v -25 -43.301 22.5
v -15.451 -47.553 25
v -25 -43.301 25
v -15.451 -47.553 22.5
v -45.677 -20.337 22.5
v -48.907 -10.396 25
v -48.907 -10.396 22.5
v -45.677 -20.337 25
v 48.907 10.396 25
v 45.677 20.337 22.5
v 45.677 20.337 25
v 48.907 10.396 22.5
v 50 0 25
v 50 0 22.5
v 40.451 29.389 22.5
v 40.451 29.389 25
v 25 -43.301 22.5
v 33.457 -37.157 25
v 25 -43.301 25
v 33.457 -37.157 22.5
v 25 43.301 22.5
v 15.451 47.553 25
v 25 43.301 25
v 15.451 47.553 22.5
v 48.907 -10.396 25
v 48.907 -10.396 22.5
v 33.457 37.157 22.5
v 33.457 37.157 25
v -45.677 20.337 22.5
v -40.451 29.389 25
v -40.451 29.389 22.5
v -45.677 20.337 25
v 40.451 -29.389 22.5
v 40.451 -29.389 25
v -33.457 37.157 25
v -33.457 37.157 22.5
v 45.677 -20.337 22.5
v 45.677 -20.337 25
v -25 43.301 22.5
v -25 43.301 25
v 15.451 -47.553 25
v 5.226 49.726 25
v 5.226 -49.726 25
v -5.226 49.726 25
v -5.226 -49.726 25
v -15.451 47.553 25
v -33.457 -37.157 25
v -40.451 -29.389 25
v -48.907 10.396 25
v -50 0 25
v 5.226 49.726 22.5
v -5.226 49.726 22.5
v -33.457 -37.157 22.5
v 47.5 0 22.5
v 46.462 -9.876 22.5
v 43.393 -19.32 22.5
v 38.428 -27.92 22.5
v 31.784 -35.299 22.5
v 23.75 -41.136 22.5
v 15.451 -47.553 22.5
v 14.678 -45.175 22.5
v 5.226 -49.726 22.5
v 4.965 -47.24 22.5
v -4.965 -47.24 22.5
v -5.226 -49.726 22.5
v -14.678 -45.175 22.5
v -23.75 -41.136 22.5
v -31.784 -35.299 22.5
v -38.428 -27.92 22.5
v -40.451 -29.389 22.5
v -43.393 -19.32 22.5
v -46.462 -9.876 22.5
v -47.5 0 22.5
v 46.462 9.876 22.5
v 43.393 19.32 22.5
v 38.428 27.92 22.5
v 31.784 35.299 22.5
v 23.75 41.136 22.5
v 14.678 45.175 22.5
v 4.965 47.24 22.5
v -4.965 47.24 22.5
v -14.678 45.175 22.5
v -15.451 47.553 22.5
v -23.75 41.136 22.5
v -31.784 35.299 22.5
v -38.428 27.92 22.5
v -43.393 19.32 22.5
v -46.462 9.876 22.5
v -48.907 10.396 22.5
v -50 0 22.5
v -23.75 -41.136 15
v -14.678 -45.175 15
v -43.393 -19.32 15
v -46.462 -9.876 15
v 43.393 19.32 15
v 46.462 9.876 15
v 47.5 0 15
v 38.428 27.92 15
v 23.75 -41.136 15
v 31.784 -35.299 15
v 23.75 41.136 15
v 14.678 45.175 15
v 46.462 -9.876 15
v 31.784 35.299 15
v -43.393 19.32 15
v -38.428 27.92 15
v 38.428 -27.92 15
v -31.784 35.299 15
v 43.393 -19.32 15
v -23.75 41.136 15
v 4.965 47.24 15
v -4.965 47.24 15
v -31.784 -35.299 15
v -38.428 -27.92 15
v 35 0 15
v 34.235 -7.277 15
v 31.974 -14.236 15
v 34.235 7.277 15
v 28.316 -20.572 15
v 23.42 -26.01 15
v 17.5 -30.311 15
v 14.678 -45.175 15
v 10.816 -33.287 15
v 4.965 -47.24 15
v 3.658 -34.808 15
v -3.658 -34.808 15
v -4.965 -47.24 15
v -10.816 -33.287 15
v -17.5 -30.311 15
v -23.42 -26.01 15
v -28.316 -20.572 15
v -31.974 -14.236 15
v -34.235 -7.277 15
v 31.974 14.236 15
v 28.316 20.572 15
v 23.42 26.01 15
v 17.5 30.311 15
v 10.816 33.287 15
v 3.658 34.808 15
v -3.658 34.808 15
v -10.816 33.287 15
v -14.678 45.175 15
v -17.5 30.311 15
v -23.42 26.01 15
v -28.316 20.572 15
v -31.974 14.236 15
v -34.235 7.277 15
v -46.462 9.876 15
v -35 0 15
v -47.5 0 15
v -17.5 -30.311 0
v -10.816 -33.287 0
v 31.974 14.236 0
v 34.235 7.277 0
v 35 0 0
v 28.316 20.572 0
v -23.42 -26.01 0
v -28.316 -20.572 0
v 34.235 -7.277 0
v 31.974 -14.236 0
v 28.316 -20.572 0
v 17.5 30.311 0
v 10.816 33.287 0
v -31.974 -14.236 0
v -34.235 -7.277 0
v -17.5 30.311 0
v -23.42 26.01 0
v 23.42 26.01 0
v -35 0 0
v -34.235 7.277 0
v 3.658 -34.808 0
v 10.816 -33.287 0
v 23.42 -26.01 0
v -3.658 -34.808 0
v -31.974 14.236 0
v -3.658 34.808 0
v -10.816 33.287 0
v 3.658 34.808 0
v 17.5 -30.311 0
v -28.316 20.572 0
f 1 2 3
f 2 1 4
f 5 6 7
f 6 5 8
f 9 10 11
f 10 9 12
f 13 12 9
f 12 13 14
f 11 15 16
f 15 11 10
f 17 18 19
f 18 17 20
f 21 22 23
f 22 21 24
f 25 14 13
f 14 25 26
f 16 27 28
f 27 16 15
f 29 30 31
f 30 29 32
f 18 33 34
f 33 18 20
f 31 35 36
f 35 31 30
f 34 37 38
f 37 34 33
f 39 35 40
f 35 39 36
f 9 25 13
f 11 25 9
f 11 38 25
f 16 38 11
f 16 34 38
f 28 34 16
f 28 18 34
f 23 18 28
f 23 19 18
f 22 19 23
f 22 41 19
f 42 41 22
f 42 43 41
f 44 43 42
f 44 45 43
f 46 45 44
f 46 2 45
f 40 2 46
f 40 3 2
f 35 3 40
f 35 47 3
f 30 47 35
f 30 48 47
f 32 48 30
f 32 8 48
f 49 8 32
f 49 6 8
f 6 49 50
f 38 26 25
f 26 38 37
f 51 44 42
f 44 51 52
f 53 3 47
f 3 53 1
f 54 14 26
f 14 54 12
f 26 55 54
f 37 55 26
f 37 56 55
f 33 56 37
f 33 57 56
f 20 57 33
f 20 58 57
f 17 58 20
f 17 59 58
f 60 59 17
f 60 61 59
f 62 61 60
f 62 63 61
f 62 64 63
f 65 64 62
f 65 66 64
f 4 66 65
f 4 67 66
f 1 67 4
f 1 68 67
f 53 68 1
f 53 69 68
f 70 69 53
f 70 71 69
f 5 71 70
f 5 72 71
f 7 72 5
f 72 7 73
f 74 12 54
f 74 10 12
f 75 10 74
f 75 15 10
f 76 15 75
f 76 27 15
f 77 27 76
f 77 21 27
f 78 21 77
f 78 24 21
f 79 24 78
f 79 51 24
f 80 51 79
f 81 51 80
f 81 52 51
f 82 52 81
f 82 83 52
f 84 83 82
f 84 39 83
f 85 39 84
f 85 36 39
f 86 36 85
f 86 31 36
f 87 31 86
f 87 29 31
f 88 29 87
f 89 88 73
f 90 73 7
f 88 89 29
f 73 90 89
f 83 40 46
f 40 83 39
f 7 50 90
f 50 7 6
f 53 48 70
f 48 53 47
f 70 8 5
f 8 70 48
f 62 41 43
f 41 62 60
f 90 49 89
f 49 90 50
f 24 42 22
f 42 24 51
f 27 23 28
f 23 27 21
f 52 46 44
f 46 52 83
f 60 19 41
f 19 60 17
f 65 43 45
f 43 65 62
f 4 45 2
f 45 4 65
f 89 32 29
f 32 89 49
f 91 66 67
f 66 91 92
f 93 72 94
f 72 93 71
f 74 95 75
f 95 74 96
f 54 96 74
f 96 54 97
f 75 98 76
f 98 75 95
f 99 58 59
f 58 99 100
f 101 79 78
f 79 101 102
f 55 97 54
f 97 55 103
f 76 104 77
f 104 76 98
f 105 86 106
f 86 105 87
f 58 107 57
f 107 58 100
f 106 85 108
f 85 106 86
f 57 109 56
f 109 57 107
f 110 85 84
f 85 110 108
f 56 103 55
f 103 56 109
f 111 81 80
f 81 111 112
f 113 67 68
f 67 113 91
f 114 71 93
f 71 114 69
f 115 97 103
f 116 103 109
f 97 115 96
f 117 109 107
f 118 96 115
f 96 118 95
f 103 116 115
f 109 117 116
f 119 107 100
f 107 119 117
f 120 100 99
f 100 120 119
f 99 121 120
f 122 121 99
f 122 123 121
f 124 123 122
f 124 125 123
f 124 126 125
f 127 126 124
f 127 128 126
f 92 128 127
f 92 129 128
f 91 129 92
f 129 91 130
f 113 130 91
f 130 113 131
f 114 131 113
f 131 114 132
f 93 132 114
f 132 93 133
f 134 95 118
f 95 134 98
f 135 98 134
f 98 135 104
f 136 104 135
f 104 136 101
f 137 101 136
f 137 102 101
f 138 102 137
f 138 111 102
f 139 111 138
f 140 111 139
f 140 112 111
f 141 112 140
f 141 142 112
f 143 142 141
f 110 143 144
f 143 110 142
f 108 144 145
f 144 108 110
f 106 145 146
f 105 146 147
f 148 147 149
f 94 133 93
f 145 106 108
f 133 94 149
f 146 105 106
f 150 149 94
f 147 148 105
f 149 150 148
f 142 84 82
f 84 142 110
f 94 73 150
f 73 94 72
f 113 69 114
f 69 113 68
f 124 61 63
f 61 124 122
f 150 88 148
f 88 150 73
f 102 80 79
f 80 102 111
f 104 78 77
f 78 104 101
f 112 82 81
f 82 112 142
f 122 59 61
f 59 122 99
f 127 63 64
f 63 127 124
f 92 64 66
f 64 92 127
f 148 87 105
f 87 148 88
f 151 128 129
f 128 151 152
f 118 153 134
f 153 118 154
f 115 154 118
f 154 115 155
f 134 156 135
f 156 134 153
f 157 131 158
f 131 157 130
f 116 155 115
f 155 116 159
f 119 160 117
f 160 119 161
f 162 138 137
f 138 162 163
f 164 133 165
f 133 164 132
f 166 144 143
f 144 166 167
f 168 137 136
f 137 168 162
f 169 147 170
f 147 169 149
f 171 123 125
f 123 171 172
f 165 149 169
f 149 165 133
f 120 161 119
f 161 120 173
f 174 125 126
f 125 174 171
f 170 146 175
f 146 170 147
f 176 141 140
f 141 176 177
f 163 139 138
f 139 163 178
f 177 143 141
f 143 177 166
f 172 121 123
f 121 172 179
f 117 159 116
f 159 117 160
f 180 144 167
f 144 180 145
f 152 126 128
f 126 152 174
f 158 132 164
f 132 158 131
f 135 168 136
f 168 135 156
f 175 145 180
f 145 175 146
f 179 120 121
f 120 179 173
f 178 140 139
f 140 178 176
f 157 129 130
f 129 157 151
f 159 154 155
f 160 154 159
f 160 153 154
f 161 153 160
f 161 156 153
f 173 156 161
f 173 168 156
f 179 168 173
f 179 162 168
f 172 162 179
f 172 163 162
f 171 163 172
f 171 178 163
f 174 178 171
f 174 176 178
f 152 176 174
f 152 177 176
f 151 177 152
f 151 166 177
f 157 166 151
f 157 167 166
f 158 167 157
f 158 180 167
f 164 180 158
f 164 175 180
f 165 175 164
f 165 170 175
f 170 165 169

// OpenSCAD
//middle.scad v2

color("white") level(50, 25);

module middle_section(width, height){
   level_height=height/6;
   level_radius=0.5*width;

   for(h=[0:1:5]){
     floor_offset=h*level_height;
       
     translate([0,0,floor_offset]) 
       level(level_radius, level_height);
   }
} 

module level(level_radius, level_height){
    lip_height= 0.1*level_height;
    inner_radius= 0.7*level_radius;
    overhang_height= 0.3*level_height;
    overhang_radius= 0.95*level_radius;
    
    //lip
    translate([0,0,level_height-lip_height])
      cylinder(h=lip_height, r1=level_radius, r2=level_radius);
    
    //overhang
    translate([0,0,0.60*level_height]) 
       cylinder(h=overhang_height,r1=overhang_radius, r2=overhang_radius); 
    
    //inner structure
    cylinder(h=level_height, r1=inner_radius, r2=inner_radius);
}
